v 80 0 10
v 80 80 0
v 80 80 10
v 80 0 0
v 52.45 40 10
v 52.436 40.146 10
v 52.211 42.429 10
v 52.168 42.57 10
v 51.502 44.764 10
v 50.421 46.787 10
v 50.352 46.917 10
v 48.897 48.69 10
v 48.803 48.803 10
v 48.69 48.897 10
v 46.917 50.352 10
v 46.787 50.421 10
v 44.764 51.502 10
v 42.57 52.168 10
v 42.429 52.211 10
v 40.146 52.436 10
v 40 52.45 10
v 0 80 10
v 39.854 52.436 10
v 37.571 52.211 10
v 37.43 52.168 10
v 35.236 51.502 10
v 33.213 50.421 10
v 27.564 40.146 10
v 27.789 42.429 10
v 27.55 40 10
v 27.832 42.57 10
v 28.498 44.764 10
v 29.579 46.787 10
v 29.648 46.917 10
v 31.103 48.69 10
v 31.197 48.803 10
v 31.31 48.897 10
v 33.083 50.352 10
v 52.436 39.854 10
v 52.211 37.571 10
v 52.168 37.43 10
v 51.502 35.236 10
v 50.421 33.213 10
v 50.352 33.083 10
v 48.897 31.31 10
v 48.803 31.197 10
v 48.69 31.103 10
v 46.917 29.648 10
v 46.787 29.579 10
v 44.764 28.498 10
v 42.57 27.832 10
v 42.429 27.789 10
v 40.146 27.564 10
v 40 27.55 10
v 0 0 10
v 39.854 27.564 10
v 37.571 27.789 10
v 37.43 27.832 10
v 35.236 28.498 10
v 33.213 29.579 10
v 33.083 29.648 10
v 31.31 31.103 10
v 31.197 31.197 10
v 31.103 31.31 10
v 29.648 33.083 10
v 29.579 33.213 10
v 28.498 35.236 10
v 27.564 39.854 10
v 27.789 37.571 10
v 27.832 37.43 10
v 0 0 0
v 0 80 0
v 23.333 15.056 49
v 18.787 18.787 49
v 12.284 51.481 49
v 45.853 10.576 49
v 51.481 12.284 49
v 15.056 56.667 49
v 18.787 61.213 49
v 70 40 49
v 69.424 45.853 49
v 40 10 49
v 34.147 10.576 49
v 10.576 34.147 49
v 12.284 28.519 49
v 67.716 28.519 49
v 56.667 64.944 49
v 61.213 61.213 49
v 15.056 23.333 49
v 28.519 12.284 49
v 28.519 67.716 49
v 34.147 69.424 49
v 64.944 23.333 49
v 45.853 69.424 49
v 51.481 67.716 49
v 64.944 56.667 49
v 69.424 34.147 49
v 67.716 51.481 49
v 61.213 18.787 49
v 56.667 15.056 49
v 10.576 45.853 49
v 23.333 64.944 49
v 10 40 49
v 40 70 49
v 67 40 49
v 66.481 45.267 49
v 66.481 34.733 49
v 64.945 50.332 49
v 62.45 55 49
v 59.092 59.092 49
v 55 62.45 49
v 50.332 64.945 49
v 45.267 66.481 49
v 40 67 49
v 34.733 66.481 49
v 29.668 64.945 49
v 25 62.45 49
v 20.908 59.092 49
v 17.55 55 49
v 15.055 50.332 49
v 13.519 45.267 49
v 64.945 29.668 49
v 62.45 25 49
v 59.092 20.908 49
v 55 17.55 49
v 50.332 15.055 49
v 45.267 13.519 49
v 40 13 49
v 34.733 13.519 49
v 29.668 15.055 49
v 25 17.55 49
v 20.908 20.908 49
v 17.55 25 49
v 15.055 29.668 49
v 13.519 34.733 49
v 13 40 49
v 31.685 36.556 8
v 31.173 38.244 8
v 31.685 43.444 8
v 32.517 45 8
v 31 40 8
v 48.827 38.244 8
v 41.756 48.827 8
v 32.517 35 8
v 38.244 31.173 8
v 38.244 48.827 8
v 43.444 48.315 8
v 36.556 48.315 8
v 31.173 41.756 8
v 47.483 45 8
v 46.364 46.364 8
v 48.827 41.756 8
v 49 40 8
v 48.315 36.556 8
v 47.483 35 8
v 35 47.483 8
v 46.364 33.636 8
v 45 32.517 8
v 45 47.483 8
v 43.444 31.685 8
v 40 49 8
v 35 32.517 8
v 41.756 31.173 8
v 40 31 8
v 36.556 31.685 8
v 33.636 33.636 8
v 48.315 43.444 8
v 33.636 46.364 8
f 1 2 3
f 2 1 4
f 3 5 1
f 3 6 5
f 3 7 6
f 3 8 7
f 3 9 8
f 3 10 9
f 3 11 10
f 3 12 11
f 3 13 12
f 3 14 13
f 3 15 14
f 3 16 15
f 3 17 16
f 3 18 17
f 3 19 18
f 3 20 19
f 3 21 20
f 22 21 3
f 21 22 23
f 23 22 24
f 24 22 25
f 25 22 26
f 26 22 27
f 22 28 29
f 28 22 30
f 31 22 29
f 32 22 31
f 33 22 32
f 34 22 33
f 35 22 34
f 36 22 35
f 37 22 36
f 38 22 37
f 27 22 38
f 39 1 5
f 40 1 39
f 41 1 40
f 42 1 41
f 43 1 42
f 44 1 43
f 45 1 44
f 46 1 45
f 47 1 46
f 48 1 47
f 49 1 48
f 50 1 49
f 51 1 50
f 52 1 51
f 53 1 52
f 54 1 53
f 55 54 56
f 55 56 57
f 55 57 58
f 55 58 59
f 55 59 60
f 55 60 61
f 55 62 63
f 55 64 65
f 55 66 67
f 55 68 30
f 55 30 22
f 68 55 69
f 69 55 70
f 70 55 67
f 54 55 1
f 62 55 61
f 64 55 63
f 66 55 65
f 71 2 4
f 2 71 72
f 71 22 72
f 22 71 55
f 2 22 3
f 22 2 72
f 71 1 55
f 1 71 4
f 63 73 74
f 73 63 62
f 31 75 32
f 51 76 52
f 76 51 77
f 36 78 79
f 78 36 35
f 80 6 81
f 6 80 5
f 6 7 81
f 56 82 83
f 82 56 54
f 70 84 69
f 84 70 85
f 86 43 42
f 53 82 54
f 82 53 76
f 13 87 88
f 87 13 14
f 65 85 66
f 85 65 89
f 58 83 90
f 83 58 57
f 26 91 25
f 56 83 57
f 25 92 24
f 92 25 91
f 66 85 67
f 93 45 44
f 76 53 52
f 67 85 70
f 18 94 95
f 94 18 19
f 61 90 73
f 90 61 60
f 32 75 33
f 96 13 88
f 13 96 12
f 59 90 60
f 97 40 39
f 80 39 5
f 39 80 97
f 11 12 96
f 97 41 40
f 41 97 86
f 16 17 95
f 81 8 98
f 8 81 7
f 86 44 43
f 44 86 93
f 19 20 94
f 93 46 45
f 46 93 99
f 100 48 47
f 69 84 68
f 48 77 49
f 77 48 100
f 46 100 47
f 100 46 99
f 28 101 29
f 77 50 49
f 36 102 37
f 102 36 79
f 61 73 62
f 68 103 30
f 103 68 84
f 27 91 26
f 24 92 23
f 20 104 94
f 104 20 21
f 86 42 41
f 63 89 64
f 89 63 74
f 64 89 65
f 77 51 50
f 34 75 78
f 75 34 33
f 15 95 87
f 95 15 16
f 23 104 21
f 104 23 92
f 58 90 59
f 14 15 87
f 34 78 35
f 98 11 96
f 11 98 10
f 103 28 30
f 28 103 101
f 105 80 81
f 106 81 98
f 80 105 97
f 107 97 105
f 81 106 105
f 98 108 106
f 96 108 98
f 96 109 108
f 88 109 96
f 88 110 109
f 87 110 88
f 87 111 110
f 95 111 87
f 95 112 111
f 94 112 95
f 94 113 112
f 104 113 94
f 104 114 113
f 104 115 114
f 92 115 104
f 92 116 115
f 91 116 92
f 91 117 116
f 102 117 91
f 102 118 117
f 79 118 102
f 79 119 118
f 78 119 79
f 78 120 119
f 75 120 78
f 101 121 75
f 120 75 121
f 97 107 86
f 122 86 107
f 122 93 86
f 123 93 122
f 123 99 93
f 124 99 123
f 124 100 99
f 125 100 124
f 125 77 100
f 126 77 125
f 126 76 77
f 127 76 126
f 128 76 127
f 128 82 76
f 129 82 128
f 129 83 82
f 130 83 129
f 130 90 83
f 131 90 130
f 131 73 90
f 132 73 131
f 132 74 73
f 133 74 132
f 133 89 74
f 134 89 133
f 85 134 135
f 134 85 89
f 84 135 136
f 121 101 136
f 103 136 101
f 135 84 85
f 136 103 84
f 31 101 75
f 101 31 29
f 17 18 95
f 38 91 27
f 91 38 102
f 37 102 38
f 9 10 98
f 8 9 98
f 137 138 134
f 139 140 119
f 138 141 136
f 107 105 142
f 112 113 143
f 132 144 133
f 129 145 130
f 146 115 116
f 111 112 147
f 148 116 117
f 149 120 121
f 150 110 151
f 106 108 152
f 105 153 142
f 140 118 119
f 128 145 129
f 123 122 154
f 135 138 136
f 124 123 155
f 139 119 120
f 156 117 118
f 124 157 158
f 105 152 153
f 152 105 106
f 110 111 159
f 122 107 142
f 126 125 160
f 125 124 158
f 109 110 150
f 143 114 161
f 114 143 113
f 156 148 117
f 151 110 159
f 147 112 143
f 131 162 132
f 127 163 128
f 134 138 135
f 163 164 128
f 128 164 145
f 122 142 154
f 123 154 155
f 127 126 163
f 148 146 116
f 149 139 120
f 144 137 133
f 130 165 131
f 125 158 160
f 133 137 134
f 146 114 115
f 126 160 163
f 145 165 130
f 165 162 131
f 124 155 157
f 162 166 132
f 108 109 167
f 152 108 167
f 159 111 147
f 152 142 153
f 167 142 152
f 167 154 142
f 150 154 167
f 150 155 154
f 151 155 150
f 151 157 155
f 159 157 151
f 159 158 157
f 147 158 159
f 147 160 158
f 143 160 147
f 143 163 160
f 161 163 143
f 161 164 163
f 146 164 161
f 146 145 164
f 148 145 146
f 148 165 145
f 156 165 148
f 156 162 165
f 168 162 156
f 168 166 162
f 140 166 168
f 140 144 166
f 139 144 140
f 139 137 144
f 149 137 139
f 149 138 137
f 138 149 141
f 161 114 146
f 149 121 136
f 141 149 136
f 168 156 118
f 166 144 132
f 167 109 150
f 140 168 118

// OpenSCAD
$fn = 32;

// ----------------------------------------------------------------------
// Hopper: funnel with square flange
// ----------------------------------------------------------------------

// --- parameters (mm) ---
fl = 80;                  // flange side, X and Y
fl_t = 10;                // flange thickness
cone_h = 40;              // cone height above the flange
top_d = 60;               // cone mouth diameter
bot_d = 24;               // cone spout diameter
wall = 3;                 // cone wall thickness

bore_d = bot_d - 2 * wall;  // spout bore diameter
total_h = fl_t + cone_h - 1;  // overall height

difference() {
  union() {
    cube([fl, fl, fl_t]);
    translate([fl / 2, fl / 2, fl_t - 1])
      cylinder(h = cone_h, d1 = bot_d, d2 = top_d);
  }
  translate([fl / 2, fl / 2, fl_t - 2])
    cylinder(h = cone_h + 1, d1 = bore_d, d2 = top_d - 2 * wall);
}
